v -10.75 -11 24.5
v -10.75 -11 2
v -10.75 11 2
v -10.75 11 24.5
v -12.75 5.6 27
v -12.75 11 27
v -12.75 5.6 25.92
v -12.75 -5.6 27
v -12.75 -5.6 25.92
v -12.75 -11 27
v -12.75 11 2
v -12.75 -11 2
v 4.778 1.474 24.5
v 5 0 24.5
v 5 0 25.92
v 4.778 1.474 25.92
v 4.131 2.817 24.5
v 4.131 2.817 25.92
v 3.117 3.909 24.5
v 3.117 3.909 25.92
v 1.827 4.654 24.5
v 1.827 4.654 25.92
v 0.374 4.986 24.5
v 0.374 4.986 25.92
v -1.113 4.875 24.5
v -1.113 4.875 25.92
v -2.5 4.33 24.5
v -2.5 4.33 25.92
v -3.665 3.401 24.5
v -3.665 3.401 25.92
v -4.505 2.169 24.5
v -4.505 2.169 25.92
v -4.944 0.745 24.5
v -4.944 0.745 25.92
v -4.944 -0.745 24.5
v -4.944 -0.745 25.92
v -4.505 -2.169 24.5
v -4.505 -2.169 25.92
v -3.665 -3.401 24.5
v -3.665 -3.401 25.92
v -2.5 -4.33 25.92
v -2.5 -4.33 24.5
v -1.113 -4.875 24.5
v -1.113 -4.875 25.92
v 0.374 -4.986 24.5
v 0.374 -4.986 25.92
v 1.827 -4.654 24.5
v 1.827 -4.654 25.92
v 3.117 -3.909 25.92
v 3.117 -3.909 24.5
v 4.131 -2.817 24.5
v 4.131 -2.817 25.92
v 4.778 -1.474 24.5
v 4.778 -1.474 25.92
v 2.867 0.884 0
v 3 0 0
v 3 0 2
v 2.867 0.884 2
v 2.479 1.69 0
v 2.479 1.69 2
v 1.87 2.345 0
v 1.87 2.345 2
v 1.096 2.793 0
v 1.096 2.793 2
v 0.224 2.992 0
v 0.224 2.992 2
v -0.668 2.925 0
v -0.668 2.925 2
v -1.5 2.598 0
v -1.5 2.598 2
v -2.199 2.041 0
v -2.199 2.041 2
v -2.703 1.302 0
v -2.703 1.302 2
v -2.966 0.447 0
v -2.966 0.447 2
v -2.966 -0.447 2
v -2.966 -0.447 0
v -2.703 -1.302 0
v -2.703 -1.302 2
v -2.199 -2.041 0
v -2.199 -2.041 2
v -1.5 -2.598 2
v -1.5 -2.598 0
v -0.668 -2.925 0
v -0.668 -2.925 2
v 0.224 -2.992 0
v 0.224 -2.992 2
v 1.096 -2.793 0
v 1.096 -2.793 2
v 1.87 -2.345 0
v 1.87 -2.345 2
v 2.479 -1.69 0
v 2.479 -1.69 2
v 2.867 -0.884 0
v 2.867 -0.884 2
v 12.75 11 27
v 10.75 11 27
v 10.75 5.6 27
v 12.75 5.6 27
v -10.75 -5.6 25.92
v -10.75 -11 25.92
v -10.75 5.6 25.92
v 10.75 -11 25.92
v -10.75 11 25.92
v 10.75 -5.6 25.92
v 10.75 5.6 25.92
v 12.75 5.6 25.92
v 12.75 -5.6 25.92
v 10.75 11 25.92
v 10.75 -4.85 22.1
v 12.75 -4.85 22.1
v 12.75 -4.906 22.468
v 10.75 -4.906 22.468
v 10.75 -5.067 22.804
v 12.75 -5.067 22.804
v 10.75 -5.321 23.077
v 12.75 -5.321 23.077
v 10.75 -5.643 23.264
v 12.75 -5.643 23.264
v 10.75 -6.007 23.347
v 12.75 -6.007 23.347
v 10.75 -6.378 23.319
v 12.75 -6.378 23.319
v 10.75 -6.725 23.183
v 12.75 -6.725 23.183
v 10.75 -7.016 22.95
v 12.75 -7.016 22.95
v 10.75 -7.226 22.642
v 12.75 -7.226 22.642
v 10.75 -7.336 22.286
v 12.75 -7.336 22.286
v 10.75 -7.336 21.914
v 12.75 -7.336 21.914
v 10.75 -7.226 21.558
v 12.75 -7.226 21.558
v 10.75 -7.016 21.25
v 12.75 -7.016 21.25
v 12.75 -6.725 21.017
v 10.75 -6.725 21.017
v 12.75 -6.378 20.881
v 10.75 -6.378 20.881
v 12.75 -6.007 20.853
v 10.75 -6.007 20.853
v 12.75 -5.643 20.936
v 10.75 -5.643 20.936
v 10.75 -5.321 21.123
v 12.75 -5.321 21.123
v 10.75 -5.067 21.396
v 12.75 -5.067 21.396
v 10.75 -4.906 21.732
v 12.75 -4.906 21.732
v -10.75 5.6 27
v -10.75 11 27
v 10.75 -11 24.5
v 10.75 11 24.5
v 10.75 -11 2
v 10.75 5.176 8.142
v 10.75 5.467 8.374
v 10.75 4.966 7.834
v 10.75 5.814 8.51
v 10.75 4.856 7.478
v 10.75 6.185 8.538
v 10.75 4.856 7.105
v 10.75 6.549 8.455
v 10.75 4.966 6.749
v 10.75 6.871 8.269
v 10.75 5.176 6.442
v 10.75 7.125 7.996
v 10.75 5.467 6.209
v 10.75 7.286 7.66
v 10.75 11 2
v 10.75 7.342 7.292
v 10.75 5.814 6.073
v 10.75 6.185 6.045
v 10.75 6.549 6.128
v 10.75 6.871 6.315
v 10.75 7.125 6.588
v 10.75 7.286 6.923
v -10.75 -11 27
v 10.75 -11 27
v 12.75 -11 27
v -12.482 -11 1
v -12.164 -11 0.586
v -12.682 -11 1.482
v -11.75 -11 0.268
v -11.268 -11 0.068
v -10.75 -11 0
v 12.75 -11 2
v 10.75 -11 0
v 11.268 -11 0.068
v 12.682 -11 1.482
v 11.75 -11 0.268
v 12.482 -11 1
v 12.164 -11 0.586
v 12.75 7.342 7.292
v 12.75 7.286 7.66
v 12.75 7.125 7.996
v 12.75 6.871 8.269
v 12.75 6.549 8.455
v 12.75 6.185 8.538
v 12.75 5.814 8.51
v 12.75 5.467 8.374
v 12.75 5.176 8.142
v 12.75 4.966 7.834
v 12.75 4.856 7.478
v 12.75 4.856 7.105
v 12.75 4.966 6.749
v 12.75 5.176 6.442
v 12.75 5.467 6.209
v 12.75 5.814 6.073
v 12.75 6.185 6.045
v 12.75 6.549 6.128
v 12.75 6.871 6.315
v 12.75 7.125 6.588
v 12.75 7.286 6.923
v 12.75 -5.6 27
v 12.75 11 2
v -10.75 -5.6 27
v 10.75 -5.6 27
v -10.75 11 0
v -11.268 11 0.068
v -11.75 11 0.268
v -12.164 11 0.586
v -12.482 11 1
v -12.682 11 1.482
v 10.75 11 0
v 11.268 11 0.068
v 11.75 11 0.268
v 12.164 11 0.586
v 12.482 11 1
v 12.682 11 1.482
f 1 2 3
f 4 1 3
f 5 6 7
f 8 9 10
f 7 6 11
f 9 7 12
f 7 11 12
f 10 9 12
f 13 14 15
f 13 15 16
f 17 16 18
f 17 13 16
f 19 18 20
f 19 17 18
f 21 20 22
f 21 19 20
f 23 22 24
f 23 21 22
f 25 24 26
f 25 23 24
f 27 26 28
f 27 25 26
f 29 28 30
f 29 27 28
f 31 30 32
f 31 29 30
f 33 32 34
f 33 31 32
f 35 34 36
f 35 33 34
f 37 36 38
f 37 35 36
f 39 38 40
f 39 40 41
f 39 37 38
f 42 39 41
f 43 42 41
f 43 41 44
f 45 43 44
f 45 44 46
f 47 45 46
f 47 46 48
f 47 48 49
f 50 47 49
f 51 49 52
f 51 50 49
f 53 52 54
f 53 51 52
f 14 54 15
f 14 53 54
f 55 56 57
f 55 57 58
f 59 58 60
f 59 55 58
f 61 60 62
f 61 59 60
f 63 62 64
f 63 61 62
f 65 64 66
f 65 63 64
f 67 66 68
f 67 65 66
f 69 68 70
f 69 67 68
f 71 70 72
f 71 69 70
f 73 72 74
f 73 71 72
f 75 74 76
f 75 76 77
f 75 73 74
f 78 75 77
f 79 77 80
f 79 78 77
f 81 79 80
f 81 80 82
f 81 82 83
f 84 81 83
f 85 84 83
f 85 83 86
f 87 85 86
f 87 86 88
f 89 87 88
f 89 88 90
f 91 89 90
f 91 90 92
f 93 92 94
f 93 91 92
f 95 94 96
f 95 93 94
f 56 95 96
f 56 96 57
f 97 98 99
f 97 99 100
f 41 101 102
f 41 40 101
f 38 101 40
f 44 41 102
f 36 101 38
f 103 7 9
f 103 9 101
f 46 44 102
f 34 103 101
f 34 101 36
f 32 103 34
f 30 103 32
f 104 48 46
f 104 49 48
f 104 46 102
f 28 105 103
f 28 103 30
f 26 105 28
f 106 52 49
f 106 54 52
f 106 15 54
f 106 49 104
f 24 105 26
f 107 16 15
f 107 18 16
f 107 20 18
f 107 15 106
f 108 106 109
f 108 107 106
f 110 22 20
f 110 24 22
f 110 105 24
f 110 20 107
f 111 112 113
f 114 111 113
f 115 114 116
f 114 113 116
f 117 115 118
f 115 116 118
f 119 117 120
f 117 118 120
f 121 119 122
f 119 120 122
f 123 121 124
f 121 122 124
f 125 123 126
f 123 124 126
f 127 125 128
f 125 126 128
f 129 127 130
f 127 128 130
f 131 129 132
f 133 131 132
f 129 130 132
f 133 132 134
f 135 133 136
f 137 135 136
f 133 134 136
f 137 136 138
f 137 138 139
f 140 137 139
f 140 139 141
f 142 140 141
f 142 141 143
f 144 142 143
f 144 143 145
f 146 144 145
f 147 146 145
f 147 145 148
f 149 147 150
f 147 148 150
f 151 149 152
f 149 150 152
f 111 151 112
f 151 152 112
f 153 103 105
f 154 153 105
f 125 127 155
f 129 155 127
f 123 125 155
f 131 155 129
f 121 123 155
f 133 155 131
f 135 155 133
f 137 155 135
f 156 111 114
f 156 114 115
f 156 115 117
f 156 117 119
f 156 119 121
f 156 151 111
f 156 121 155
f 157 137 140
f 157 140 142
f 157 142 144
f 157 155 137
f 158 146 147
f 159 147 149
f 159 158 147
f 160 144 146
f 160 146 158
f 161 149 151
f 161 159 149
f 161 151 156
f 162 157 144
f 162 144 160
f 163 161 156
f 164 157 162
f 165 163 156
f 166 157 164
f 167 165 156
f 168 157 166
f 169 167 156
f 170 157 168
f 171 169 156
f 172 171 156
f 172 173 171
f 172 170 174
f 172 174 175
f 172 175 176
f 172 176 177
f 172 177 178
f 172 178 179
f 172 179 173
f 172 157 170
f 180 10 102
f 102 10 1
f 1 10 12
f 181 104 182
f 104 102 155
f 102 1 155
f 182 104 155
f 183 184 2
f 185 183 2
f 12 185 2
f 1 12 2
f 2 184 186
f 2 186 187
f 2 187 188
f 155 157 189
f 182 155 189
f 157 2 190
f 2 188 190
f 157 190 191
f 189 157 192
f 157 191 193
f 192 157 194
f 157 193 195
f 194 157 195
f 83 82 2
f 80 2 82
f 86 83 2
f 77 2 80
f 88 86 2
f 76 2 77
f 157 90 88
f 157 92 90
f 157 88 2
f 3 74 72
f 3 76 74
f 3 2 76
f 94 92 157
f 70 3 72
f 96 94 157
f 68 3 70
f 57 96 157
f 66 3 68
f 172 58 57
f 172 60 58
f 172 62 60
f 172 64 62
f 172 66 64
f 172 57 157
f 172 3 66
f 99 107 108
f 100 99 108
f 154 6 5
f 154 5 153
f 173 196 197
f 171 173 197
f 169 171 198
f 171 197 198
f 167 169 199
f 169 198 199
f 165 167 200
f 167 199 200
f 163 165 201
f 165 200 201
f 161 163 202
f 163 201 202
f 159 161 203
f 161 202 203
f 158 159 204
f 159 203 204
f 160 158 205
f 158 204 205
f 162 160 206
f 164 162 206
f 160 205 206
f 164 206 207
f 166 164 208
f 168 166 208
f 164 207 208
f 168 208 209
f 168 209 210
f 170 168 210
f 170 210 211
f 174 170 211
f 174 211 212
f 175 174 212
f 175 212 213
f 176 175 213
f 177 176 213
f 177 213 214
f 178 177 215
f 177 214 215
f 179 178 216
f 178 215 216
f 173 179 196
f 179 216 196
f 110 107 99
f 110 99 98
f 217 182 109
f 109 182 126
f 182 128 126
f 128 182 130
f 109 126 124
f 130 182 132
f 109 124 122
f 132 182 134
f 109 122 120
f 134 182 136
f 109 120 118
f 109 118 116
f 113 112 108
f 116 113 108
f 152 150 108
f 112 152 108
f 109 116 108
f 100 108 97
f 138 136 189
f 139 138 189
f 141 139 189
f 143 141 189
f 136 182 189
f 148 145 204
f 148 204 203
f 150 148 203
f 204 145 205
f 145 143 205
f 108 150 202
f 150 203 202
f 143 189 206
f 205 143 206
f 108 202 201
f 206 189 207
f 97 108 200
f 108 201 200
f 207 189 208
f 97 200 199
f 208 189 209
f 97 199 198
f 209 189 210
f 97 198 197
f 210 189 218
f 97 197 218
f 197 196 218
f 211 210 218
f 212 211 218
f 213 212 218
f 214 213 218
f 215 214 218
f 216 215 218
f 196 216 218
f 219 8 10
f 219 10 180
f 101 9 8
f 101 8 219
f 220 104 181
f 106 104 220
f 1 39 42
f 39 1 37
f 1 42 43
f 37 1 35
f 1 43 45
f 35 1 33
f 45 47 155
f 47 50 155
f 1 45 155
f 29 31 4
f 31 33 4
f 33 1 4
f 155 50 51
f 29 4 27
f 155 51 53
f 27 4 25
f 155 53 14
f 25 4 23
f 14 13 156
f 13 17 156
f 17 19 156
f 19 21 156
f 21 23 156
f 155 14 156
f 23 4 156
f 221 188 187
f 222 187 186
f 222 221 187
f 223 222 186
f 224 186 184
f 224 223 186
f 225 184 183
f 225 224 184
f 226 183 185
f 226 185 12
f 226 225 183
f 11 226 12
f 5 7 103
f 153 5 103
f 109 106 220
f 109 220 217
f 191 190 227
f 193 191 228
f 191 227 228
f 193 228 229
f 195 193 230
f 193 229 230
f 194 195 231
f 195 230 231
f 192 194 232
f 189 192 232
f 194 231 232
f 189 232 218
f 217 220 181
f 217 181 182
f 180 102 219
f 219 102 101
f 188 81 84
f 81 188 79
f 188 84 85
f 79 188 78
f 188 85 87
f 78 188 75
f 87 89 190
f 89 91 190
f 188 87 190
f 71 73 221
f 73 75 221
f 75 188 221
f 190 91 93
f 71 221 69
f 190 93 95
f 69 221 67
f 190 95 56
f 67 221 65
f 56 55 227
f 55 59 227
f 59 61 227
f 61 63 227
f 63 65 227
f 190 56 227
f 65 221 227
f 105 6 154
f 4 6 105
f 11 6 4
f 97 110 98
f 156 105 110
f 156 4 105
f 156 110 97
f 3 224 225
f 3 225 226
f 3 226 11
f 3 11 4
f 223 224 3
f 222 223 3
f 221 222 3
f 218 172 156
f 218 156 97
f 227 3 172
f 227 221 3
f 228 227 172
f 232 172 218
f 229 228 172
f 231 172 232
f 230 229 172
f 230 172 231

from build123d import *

# Parameters (mm, degrees)
F0_W     = 25.5
F0_H     = 22
F0_R     = 3
F1_DEPTH = 2
F2_W     = 2
F2_H     = 5.4
F3_DEPTH = 25
F2_H_2   = 11.2
F4_DEPTH = 22.5
F5_R     = 2
F6_R     = 5
F7_DEPTH = 1.42
F8_R     = 1.25
F9_DEPTH = 2


with BuildPart() as f1:
    # F0 (on Top) → F1 (new body)
    with BuildSketch(Plane.XY):
        Rectangle(F0_W, F0_H)
        Circle(F0_R, mode=Mode.SUBTRACT)
    extrude(amount=F1_DEPTH)

    # F2 (on face) → F3 (join)
    with BuildSketch(Plane.XY.offset(2)):
        with Locations((-11.75, 8.3)):
            Rectangle(F2_W, F2_H)
        with Locations((11.75, 8.3)):
            Rectangle(F2_W, F2_H)
        with Locations((11.75, -8.3)):
            Rectangle(F2_W, F2_H)
        with Locations((-11.75, -8.3)):
            Rectangle(F2_W, F2_H)
    extrude(amount=F3_DEPTH)

    # F2 (on face) → F4 (join)
    with BuildSketch(Plane.XY.offset(2)):
        with Locations((11.75, 0)):
            Rectangle(F2_W, F2_H_2)
        with Locations((-11.75, 0)):
            Rectangle(F2_W, F2_H_2)
    extrude(amount=F4_DEPTH)

    # F5
    f5_edges = [f1.edges().sort_by_distance(p)[0] for p in [
        (12.75, 0, 0),
        (-12.75, 0, 0),
    ]]
    fillet(f5_edges, radius=F5_R)

    # F6 (on face) → F7 (join)
    with BuildSketch(Plane.XY.offset(24.5)):
        Polygon((10.75, -5.6), (12.75, -5.6), (12.75, 5.6), (10.75, 5.6), (10.75, 11), (-10.75, 11), (-10.75, 5.6), (-12.75, 5.6), (-12.75, -5.6), (-10.75, -5.6), (-10.75, -11), (10.75, -11), align=None)
        Circle(F6_R, mode=Mode.SUBTRACT)
    extrude(amount=F7_DEPTH)

    # F8 (on face) → F9 (cut, through all)
    with BuildSketch(Plane.YZ.offset(12.75)):
        with Locations((-6.1, 22.1)):
            Circle(F8_R)
        with Locations((6.092, 7.2918)):
            Circle(F8_R)
    extrude(amount=-F9_DEPTH, mode=Mode.SUBTRACT)


solid = f1.part
